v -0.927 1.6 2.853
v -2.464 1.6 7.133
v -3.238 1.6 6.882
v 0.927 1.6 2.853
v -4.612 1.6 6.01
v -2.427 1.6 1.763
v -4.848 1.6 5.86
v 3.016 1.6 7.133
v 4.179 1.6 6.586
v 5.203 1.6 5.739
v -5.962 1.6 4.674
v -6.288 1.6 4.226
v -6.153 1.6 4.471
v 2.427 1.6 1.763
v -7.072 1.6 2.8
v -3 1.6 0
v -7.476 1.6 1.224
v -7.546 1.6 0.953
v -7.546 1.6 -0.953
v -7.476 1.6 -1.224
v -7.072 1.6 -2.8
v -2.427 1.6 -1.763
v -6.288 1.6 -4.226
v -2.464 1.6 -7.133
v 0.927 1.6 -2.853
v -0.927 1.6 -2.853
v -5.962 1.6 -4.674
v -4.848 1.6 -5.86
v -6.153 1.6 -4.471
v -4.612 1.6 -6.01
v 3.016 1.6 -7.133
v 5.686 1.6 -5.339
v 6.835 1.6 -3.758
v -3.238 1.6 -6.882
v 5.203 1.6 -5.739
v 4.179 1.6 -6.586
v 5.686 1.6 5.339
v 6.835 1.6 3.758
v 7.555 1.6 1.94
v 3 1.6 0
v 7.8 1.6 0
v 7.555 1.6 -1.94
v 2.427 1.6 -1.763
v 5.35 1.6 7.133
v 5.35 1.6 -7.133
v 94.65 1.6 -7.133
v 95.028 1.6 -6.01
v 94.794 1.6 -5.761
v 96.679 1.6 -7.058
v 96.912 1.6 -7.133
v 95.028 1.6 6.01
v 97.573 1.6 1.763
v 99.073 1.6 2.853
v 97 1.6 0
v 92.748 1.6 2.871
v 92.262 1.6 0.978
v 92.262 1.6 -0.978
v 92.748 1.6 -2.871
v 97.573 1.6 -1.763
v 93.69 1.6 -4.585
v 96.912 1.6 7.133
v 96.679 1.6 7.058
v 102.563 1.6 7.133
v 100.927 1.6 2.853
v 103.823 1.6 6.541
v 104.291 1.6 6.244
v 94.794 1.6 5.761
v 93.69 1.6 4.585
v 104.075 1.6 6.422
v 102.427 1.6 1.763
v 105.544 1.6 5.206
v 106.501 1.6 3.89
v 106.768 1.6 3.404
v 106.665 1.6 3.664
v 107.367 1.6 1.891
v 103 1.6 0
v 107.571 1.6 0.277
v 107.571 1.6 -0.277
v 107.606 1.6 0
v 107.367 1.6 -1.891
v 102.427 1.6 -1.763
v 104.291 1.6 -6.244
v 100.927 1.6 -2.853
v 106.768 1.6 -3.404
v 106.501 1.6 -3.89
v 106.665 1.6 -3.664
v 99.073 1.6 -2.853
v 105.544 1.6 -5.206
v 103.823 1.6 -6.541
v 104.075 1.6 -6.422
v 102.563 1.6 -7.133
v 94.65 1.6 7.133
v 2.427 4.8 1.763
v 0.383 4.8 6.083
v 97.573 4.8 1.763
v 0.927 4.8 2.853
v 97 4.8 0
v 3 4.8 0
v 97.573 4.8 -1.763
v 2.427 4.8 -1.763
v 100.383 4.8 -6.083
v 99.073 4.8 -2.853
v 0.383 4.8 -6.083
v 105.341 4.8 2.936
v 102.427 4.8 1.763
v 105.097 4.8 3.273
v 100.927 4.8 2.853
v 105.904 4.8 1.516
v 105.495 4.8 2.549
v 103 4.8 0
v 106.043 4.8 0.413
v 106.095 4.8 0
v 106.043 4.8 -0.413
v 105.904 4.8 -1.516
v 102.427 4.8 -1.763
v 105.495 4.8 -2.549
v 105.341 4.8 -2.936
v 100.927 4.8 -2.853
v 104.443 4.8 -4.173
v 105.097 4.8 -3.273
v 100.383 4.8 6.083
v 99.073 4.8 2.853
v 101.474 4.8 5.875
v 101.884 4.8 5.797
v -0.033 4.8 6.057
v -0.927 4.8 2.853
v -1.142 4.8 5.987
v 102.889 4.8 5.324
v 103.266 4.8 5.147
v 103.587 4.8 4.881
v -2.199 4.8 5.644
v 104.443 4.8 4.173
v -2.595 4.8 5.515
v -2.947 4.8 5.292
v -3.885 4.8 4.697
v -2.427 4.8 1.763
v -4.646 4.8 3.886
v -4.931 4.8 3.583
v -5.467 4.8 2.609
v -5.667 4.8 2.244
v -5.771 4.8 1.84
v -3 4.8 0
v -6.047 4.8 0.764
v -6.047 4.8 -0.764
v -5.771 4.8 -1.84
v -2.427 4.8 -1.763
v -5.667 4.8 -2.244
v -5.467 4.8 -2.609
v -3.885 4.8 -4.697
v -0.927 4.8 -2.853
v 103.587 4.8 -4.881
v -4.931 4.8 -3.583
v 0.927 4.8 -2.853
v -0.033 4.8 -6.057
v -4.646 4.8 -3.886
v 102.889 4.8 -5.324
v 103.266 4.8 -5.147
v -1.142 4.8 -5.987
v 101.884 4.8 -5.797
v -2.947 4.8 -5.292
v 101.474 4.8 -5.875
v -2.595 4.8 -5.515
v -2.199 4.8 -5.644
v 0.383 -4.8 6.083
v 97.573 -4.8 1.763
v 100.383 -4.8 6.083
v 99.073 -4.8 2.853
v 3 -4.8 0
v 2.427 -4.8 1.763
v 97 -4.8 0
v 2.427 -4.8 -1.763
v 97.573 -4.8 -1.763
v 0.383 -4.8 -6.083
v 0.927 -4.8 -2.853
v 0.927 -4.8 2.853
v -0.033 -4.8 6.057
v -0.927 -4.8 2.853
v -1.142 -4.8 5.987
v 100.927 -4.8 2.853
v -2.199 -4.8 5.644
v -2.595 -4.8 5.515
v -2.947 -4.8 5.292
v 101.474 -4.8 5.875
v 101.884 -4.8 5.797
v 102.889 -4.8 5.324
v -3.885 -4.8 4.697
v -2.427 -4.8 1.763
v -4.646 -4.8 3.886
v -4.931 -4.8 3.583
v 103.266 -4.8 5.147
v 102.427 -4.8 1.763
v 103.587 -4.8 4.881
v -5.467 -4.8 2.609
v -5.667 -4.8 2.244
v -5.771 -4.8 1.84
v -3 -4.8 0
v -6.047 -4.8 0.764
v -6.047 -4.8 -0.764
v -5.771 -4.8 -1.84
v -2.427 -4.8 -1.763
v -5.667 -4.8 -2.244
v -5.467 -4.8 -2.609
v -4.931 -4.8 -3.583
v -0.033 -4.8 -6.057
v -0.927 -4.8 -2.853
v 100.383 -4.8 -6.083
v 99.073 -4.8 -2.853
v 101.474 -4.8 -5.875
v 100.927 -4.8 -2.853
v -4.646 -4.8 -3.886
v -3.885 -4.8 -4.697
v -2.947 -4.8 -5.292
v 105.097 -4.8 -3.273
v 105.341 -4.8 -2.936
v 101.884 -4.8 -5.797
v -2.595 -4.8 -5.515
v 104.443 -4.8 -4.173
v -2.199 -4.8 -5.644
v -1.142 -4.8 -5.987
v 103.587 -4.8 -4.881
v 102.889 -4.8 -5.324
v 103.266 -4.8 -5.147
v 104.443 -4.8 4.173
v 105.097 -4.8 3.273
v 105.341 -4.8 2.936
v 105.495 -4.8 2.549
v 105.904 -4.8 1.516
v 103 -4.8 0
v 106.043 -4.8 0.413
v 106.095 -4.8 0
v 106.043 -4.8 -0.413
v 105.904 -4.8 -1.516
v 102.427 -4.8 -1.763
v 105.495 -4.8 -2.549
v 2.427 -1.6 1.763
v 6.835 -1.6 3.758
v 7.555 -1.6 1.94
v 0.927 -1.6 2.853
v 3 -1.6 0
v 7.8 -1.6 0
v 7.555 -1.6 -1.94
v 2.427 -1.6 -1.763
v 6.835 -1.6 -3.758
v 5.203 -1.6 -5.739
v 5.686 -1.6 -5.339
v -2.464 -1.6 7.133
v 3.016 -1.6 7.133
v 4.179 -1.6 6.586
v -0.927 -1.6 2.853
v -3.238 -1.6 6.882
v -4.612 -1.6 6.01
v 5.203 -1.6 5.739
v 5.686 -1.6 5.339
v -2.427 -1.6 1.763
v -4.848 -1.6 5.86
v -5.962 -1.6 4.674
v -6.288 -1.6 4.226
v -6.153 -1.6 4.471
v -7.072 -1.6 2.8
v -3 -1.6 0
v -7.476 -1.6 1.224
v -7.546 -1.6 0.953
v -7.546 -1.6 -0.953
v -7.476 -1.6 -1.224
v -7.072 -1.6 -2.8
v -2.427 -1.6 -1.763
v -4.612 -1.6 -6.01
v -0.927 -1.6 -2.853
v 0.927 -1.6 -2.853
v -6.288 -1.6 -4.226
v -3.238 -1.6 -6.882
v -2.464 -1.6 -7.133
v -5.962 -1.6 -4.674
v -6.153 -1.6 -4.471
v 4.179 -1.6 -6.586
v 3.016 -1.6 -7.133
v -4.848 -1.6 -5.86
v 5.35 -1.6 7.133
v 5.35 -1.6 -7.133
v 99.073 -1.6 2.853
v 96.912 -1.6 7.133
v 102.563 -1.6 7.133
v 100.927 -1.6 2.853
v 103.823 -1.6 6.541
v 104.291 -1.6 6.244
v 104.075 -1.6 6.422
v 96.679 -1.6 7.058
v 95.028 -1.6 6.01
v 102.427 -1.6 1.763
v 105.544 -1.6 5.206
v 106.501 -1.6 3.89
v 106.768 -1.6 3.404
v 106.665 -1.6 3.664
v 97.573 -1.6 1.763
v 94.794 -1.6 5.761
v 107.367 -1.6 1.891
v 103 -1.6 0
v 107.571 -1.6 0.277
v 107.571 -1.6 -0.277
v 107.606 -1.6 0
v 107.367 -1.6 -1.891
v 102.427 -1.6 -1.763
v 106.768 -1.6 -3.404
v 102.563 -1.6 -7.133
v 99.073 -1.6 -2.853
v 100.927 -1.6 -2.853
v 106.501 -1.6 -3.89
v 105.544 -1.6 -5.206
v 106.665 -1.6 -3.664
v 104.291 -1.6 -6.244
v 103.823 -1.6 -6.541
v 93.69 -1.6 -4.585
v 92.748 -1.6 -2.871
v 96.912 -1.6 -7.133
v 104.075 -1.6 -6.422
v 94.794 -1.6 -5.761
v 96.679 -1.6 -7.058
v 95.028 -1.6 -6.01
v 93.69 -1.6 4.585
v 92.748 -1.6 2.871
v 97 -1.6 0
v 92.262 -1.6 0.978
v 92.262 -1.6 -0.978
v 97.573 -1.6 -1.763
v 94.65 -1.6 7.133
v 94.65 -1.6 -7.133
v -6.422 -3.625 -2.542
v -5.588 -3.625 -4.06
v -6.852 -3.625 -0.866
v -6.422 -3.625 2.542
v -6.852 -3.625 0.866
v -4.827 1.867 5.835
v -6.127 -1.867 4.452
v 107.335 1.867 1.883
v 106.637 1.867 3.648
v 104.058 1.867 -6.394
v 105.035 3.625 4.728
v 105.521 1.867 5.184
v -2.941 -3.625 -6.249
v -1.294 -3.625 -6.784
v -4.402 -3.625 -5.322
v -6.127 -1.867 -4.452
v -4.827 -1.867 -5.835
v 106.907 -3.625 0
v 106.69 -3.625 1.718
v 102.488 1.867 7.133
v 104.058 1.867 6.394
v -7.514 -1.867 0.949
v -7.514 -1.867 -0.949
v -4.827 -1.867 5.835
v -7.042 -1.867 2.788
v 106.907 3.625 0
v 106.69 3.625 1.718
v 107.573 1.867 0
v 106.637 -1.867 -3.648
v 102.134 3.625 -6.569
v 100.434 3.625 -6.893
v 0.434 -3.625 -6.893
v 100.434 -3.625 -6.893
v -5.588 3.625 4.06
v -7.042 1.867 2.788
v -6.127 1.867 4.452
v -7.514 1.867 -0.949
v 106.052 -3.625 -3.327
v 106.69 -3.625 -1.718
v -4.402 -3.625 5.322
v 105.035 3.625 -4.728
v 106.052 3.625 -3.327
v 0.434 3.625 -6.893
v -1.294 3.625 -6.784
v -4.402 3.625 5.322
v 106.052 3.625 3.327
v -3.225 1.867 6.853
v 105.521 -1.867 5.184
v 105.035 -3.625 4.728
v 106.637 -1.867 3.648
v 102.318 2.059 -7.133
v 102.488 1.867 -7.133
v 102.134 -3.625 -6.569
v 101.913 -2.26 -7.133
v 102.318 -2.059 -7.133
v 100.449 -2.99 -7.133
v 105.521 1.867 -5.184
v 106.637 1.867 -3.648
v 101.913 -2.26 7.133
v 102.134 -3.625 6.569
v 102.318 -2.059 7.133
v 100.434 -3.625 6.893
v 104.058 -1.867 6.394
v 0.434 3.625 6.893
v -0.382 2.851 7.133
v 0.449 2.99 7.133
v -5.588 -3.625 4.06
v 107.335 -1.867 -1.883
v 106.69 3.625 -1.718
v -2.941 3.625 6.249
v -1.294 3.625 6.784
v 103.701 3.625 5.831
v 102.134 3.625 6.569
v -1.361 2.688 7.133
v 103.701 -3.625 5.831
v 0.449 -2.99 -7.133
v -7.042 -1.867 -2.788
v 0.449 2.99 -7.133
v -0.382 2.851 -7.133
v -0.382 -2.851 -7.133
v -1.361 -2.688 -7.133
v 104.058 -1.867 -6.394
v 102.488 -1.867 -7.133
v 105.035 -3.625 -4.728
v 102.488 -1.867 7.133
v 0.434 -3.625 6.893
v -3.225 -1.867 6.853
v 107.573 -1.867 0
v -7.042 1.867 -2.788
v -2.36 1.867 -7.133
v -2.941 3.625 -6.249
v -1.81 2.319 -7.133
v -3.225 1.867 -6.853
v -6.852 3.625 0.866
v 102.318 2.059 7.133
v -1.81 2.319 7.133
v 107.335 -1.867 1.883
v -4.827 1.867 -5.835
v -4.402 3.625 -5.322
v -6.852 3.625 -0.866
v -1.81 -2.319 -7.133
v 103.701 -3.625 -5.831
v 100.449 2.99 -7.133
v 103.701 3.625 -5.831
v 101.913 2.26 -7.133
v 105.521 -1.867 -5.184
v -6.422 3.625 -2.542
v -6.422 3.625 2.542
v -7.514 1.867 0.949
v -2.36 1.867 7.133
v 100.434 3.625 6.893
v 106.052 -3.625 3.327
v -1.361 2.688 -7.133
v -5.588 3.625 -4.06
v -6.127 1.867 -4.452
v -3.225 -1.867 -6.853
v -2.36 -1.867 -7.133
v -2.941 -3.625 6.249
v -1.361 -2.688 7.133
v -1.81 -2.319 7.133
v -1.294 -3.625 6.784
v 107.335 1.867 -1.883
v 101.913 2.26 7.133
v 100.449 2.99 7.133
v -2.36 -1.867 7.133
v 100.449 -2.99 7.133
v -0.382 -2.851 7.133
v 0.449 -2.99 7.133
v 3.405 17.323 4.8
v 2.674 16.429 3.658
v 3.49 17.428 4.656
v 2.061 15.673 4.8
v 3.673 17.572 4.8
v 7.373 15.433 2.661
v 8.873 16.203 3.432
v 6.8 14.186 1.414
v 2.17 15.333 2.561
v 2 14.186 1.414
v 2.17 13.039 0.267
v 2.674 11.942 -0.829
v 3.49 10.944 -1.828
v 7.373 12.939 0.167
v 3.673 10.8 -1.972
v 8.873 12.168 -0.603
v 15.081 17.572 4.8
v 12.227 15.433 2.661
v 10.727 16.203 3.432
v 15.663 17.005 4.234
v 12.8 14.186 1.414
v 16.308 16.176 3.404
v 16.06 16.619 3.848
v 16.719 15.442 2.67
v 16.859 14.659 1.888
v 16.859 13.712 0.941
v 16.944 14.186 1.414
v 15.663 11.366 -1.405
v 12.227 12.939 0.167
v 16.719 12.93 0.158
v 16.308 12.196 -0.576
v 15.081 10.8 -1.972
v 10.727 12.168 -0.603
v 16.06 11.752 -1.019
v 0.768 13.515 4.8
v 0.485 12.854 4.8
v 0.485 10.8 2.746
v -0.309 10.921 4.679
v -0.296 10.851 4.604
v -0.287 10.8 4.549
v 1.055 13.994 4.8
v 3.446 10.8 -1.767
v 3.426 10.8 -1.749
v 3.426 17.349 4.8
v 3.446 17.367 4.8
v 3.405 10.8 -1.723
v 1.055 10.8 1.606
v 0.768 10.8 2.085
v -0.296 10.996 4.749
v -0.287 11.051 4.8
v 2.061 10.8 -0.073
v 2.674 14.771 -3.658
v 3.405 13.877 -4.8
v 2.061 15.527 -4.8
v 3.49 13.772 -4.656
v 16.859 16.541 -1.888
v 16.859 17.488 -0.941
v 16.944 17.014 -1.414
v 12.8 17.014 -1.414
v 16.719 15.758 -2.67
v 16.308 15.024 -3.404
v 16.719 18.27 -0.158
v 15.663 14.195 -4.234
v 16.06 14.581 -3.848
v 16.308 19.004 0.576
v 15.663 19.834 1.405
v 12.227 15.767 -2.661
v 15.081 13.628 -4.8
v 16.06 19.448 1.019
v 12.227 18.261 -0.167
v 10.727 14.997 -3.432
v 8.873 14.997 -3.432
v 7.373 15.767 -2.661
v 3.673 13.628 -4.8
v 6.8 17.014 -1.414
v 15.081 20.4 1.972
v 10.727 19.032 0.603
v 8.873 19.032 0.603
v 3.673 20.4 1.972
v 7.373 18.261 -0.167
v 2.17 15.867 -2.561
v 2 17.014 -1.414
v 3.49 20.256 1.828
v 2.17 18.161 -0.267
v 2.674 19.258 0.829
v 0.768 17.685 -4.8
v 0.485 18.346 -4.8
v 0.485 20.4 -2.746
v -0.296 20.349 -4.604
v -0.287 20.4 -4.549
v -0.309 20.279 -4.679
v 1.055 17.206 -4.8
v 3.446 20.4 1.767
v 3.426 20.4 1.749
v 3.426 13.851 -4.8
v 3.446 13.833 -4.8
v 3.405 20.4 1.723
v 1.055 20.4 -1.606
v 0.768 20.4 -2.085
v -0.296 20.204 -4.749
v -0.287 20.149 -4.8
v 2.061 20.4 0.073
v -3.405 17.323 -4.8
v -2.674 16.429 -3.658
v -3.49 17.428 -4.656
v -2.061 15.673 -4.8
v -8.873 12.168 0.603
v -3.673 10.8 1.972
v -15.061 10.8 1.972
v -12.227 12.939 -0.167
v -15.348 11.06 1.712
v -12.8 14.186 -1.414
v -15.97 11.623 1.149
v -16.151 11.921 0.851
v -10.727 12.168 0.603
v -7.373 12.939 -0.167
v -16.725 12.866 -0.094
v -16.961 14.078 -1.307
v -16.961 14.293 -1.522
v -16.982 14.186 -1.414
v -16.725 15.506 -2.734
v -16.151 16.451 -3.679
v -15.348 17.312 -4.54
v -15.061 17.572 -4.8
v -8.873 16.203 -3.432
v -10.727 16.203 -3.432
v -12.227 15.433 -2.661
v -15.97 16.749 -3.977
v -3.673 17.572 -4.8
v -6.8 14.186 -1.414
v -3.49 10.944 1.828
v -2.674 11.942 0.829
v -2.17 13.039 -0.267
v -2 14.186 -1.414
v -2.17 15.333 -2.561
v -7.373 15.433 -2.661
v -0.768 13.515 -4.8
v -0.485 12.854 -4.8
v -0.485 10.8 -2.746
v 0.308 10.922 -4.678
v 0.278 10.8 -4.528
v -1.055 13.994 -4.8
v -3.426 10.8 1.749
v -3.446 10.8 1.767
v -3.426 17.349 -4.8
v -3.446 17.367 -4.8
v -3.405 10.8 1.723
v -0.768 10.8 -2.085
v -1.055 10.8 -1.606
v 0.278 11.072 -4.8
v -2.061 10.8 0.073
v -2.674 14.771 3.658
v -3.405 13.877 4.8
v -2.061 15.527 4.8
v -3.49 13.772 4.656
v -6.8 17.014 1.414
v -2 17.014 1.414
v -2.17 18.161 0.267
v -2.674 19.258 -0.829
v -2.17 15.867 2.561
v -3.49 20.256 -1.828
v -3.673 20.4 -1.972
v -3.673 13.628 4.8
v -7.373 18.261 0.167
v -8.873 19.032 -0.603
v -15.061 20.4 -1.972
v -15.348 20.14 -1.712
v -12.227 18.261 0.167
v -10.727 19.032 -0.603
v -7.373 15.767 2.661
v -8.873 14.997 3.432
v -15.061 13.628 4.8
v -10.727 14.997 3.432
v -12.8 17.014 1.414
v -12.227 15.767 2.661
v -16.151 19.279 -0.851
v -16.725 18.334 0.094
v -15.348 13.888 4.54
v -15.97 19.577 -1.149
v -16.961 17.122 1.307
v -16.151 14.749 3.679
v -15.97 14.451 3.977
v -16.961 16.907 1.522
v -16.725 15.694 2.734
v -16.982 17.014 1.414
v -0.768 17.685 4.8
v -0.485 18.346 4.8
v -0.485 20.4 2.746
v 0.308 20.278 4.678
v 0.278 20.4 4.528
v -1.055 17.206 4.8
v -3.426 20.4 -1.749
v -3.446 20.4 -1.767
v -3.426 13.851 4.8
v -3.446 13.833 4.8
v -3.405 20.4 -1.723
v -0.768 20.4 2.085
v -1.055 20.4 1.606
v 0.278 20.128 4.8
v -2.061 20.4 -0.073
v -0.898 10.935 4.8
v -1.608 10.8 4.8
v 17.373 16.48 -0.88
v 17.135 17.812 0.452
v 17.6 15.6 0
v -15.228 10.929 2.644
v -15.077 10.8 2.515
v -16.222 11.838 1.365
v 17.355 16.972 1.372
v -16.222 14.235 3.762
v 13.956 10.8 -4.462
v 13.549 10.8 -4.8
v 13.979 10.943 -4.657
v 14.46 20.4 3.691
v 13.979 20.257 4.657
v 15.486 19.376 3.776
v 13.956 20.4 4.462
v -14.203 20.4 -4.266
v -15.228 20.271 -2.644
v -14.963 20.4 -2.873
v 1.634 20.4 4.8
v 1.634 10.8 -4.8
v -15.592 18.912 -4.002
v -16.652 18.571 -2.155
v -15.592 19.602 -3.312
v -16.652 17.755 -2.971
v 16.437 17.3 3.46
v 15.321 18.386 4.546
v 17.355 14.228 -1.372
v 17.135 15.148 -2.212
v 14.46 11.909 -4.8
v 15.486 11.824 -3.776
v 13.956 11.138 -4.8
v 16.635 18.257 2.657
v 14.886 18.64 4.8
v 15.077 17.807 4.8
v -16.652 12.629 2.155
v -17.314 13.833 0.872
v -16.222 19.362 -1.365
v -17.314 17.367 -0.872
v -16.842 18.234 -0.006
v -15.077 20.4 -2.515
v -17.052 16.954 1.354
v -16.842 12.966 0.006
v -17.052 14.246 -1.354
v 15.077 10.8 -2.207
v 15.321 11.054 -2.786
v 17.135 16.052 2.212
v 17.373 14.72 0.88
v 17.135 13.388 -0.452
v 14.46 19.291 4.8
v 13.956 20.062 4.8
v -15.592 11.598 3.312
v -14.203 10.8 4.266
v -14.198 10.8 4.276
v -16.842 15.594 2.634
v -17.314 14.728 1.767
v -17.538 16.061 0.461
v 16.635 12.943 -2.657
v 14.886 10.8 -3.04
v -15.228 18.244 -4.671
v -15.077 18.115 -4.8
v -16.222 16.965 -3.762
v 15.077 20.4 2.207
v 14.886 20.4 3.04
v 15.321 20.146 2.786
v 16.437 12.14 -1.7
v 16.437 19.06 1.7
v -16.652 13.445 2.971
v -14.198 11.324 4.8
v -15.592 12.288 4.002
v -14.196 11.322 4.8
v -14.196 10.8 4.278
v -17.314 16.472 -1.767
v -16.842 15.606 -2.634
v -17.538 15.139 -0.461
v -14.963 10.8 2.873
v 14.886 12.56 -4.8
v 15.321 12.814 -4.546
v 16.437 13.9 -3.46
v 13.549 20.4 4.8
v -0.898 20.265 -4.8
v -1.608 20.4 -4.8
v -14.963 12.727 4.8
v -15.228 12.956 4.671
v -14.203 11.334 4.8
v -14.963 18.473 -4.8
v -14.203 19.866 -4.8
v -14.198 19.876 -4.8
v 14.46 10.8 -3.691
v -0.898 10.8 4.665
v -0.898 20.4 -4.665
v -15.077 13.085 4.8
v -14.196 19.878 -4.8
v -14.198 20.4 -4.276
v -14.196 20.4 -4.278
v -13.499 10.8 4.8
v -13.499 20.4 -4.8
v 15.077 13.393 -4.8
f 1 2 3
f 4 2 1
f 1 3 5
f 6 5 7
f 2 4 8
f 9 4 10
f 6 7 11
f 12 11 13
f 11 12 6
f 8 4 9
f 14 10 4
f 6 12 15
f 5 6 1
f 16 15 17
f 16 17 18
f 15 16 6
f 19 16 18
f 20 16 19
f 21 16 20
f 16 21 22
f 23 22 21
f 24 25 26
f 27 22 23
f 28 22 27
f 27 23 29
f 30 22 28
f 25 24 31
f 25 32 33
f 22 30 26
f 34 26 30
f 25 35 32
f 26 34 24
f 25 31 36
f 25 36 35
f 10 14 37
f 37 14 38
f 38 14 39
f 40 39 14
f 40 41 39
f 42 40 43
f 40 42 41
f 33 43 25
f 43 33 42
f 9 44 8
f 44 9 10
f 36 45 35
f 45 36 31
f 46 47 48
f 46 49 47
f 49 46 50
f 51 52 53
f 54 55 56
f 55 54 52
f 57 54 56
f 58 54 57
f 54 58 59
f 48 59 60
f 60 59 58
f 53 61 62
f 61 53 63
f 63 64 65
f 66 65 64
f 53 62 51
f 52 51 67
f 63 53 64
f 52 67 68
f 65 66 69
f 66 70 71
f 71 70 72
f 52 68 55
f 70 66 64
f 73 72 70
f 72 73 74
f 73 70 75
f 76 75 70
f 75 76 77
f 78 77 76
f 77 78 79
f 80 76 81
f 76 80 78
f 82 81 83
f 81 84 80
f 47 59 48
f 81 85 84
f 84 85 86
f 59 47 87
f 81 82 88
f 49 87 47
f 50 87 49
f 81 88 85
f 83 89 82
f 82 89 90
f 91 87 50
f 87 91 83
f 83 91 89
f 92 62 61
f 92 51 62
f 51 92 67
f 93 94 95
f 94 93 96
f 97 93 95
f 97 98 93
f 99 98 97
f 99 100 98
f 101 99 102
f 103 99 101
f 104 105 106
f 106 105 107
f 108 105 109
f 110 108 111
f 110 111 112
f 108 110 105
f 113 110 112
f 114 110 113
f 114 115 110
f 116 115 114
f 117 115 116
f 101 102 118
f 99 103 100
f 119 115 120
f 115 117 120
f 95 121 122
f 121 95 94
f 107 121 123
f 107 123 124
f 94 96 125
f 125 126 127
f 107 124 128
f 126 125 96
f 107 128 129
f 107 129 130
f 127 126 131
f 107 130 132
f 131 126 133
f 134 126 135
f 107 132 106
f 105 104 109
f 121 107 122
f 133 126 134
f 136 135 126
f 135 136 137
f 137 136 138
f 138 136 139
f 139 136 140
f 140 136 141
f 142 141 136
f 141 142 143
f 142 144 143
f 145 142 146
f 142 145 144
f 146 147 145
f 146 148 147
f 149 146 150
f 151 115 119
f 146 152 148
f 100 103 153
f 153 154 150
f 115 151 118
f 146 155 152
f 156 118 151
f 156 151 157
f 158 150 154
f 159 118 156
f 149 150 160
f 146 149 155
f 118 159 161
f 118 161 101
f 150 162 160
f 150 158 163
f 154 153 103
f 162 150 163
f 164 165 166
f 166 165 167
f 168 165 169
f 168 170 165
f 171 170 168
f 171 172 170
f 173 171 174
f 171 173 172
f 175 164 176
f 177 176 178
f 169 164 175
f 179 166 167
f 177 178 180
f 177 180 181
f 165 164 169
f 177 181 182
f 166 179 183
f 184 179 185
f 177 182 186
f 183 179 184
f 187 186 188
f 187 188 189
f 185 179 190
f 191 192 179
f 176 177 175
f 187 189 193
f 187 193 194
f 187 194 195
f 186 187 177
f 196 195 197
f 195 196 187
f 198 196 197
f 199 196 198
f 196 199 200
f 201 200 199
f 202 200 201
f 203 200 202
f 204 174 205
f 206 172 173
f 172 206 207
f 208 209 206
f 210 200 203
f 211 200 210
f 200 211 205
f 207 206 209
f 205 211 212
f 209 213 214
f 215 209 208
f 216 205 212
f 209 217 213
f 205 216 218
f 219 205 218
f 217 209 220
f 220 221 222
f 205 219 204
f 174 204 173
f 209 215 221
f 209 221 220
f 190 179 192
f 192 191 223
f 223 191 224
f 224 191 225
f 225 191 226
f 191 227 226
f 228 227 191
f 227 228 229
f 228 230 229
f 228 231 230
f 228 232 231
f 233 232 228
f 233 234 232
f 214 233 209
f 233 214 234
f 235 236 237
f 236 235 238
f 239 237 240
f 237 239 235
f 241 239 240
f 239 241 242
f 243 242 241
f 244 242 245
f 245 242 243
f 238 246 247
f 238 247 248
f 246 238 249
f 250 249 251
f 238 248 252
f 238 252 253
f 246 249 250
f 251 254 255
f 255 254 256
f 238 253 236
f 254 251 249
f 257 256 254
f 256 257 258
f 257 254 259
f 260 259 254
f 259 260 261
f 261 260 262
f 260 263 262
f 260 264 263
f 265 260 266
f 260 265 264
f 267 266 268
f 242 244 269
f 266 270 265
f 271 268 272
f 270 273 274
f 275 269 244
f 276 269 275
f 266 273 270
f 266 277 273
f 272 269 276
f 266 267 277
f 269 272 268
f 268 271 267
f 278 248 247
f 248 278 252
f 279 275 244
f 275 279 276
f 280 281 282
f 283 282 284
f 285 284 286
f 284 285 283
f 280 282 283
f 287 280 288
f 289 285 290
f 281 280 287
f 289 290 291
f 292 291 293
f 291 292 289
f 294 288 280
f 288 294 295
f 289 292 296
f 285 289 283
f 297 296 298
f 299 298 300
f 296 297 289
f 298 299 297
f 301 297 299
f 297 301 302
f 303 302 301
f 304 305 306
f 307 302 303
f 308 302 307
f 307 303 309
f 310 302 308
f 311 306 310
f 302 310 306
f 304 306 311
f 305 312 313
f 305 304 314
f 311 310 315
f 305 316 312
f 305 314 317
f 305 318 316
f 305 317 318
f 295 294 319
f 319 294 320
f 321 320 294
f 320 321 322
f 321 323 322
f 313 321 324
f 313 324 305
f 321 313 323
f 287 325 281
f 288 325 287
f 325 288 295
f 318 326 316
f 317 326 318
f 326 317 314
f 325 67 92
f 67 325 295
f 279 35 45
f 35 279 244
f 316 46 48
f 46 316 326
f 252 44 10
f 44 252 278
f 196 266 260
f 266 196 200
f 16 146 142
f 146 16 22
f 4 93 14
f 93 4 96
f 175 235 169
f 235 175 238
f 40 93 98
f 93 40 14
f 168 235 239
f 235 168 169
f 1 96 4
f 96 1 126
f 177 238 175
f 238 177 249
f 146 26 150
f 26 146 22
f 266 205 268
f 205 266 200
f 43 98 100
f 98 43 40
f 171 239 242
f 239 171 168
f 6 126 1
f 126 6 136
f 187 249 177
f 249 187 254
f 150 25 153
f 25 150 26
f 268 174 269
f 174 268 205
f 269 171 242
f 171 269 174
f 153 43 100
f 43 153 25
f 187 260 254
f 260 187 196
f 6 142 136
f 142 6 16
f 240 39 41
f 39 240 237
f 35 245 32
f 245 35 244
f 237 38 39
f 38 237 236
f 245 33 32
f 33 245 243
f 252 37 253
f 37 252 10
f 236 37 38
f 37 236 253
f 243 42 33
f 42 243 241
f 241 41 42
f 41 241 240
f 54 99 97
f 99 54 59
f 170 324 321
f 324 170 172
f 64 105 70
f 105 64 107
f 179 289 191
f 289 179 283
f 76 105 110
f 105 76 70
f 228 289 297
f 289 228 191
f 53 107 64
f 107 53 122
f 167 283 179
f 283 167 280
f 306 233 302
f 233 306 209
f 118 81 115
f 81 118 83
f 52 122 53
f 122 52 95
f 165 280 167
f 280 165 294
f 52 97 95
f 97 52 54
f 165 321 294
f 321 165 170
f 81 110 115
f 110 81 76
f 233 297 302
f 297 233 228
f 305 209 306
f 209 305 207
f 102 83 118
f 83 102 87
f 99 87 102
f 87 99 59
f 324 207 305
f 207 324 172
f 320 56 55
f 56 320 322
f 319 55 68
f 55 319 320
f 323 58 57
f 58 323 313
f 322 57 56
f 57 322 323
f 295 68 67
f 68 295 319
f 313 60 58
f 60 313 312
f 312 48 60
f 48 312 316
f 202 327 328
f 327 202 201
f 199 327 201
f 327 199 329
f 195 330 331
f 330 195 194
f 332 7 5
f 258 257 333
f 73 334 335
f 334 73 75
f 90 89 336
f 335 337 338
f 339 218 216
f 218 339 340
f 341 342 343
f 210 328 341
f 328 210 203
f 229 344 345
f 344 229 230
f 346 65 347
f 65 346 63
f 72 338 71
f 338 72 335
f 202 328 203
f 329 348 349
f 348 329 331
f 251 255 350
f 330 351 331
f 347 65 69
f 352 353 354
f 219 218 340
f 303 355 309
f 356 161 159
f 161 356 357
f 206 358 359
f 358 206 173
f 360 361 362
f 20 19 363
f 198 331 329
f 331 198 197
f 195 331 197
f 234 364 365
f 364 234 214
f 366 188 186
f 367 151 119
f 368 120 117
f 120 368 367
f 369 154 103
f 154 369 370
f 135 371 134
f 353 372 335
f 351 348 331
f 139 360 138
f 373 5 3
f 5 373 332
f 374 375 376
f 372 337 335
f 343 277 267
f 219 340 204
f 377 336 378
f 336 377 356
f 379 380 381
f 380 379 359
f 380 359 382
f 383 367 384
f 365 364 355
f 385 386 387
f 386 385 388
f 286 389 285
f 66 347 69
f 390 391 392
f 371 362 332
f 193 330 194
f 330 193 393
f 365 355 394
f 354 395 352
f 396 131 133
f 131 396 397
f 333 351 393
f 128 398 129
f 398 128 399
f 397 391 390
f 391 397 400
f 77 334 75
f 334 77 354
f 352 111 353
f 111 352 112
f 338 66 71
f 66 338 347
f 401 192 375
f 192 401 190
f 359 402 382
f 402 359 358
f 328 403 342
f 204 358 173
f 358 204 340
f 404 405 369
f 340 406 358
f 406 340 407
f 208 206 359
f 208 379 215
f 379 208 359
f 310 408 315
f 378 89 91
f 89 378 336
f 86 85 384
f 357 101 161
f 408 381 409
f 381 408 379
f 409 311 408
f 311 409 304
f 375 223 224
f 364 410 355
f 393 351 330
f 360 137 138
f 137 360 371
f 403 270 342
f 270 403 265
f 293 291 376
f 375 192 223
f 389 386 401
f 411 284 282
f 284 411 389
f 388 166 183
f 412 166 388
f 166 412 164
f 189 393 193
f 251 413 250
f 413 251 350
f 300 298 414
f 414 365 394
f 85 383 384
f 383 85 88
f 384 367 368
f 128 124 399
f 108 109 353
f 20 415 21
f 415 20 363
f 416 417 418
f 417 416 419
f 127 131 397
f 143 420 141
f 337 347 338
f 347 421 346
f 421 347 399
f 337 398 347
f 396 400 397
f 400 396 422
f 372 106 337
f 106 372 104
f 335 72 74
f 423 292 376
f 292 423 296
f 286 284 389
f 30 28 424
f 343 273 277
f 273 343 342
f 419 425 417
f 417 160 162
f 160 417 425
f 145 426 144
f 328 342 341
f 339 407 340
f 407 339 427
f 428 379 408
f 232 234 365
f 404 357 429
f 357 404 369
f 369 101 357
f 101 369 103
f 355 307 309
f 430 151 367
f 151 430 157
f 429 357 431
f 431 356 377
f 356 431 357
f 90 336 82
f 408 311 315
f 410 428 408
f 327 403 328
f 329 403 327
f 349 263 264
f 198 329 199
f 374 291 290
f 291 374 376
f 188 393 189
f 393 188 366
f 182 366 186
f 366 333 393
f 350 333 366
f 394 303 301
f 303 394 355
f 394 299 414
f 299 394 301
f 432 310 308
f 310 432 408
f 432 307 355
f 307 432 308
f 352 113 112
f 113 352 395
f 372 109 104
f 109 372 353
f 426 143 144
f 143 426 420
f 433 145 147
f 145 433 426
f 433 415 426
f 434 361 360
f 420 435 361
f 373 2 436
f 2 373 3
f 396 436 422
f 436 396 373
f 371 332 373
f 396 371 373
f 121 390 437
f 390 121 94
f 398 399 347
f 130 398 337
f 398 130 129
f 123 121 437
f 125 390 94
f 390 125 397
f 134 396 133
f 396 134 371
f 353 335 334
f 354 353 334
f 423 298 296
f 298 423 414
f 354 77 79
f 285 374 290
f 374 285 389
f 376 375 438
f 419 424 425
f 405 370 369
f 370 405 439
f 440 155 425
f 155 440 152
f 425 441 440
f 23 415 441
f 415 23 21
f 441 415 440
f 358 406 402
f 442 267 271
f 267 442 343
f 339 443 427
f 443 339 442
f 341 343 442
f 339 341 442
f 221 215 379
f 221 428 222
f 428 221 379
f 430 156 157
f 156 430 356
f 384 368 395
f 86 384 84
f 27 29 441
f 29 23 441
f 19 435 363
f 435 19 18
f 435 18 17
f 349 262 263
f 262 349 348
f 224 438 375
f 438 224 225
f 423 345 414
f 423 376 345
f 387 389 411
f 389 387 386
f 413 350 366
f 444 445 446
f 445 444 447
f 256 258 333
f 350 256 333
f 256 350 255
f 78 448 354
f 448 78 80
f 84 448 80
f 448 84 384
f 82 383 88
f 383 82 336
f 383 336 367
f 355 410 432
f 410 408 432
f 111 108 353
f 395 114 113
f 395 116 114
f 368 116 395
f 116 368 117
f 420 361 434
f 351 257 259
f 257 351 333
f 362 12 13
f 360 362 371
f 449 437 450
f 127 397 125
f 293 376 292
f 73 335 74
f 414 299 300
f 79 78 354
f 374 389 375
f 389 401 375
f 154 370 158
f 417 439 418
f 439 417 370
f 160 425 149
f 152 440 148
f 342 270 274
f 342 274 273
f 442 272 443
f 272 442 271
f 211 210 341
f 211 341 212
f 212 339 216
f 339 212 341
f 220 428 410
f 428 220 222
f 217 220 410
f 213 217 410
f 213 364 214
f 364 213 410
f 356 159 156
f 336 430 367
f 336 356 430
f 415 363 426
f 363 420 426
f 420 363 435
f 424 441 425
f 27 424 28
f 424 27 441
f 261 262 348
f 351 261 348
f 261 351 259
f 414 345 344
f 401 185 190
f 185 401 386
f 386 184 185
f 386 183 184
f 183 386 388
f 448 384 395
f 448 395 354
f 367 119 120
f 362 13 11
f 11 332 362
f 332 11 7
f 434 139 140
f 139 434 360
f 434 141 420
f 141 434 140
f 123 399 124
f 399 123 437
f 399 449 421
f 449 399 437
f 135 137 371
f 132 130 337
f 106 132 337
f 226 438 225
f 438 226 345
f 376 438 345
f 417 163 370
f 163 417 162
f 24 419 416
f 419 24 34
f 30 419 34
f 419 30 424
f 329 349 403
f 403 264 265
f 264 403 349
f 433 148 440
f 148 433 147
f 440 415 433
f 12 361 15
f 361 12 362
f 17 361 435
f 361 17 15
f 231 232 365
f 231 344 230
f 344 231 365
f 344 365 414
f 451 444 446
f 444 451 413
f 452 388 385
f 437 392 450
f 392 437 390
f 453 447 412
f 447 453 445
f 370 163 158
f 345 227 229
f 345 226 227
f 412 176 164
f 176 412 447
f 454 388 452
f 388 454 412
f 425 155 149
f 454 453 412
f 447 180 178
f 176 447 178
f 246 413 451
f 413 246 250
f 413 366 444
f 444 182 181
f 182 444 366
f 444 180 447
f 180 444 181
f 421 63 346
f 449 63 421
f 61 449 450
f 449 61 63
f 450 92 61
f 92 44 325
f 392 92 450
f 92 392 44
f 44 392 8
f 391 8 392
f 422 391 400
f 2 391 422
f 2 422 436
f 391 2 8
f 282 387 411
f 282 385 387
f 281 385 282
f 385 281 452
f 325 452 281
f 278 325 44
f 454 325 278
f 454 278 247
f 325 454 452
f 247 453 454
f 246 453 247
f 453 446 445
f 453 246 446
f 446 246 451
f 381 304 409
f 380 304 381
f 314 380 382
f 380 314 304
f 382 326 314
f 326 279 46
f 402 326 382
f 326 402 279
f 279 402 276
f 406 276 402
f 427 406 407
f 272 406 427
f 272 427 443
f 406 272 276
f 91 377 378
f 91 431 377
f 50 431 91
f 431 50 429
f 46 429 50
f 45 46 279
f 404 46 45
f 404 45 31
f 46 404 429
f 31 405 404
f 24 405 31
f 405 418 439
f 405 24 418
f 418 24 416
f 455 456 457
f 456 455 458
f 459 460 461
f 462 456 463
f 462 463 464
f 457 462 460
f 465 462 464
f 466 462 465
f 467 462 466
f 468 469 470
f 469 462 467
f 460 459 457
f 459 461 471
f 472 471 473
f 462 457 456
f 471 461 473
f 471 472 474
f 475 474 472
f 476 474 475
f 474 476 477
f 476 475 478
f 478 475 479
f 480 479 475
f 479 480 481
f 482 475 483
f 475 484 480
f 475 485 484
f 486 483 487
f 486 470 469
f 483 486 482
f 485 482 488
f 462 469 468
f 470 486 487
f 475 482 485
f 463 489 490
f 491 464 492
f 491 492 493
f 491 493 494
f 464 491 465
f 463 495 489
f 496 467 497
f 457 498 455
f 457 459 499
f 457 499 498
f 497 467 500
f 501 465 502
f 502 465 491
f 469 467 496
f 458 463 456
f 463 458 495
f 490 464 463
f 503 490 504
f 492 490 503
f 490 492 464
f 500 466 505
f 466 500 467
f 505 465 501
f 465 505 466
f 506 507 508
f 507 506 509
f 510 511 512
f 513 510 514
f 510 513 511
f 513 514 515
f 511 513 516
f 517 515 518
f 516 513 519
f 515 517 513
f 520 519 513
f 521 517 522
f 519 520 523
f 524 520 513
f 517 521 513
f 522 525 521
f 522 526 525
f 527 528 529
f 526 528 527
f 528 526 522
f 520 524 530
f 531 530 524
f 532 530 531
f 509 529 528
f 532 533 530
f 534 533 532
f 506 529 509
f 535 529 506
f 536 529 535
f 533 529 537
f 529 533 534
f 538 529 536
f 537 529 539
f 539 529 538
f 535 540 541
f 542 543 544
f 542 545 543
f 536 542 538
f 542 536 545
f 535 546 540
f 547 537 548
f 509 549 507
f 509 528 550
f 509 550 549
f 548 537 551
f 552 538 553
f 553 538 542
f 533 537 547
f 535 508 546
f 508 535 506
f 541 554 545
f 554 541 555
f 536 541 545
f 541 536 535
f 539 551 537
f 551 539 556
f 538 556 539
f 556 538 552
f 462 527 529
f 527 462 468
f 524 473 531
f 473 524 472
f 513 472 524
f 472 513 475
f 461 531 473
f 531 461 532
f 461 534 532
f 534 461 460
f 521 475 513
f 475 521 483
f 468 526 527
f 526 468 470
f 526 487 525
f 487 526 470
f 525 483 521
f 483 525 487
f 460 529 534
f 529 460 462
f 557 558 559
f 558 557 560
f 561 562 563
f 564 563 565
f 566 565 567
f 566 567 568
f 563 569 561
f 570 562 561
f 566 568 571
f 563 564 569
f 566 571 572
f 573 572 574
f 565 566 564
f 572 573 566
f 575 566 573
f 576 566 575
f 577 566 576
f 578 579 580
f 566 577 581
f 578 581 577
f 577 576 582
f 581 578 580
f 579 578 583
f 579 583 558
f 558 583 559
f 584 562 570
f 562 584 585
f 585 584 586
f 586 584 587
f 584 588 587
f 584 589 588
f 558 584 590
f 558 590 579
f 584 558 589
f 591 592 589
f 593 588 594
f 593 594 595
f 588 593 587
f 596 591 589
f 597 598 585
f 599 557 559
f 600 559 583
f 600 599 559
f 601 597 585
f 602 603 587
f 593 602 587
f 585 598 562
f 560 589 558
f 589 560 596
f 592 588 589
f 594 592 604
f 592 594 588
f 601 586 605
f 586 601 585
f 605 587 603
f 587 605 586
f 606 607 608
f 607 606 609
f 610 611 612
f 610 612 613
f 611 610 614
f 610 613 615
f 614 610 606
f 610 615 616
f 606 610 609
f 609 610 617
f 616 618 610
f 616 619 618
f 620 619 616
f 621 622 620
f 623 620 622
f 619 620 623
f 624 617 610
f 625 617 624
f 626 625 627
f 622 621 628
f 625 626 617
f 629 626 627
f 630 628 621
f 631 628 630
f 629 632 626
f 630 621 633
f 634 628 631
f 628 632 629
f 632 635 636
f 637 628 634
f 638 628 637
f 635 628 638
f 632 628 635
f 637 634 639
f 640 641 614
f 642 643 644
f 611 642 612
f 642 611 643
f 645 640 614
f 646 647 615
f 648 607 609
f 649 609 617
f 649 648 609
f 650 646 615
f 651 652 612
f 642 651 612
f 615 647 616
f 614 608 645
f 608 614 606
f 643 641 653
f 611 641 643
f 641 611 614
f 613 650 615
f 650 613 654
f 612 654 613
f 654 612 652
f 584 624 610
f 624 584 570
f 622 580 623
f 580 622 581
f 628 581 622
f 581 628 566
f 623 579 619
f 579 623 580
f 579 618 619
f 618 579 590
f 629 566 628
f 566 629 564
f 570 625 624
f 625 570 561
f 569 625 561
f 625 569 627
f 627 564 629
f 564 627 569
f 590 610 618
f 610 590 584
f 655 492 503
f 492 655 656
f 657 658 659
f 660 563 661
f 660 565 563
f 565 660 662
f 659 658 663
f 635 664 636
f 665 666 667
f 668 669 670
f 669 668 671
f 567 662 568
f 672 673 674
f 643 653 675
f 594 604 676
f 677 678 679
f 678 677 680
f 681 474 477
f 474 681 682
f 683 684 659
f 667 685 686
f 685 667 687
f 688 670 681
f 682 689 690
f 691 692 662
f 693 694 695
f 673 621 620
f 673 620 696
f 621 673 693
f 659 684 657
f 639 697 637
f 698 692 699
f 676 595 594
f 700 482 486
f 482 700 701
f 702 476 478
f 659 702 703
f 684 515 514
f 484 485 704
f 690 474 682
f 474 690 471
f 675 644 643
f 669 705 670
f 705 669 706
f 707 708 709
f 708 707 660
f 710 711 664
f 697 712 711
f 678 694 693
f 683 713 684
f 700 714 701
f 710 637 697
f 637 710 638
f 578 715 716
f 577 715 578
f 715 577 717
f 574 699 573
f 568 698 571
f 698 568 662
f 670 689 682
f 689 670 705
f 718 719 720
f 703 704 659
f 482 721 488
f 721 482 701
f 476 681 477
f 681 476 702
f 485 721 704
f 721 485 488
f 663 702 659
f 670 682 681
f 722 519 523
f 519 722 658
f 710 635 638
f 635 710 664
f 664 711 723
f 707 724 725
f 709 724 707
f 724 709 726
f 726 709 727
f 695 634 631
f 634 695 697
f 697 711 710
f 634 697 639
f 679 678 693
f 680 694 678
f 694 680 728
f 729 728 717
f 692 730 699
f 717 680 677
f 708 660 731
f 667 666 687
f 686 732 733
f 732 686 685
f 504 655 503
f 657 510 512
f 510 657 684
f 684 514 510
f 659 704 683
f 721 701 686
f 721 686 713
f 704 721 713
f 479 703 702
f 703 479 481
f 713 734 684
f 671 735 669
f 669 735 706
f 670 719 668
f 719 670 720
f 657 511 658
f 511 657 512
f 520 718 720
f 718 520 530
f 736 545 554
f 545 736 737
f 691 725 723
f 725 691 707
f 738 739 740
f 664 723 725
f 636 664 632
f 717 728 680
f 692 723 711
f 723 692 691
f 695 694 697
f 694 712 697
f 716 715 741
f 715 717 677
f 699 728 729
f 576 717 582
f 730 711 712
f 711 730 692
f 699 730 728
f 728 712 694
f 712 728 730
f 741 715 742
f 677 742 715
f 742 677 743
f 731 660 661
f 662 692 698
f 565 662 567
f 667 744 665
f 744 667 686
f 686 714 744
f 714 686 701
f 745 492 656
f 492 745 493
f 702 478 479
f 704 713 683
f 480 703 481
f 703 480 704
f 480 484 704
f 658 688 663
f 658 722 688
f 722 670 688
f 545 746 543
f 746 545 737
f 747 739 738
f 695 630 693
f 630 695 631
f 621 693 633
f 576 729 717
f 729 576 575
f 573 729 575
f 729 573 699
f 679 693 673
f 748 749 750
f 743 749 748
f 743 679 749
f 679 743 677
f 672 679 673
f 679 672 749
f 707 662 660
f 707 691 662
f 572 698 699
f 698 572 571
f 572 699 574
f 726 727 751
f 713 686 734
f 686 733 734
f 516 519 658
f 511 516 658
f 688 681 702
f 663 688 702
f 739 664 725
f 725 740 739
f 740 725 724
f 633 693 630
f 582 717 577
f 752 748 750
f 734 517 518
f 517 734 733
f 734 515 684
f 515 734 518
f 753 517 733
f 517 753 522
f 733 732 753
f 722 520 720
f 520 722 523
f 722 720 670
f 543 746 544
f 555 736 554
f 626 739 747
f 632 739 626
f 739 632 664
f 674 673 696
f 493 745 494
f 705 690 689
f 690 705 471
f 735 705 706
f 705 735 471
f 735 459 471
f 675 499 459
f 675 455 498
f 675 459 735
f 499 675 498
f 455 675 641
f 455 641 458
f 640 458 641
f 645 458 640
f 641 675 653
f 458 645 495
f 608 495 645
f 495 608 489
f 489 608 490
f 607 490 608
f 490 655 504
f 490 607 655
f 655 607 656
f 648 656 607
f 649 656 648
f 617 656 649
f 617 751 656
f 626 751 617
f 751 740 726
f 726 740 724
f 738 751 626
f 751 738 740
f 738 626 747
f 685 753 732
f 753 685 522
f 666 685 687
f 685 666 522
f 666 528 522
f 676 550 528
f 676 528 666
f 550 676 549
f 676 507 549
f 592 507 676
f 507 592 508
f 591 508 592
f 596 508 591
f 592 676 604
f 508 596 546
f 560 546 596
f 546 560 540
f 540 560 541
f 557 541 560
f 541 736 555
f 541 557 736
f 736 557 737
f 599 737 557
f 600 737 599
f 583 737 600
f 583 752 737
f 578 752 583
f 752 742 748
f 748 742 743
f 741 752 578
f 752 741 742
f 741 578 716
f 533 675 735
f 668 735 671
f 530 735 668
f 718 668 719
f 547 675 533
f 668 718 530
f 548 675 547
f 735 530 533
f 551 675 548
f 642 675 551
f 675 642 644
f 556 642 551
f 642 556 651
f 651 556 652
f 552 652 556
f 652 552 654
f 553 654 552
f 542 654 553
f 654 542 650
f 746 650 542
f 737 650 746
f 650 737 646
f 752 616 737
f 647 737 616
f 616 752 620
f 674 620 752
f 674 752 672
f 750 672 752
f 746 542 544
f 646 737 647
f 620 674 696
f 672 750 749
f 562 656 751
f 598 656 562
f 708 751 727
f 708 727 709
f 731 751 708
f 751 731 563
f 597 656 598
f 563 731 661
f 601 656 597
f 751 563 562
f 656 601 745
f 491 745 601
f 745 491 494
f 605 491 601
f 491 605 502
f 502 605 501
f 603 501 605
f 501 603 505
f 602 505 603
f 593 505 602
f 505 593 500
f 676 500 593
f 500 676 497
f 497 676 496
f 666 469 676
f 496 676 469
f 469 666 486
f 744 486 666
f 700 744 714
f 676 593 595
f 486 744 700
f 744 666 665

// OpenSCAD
// Low-spec flexible driveshaft
// (hopefully! not sure how it will work out..)

ra = 3;
t = 4;
r = ra + 1.2*t;
d = r + t/2;

t_rod = 0.8*t;
f=1.3;

module link_hole() {
    translate([d,0,-4*t]) cylinder(r=ra, h=8*t);
    for(a=[0,180]) rotate([a,0]) translate([d,0, t/2]) cylinder(r1=r,r2=r+4*t, h=8*t);
}

// A link in the chain, connecting two directions so it can keep its angle.
// (hopefully)
module link_whole() {
    difference() { hull() {
            translate([d, 0]) scale([r, r, f*t]/r) sphere(r);
            translate([-d, 0]) scale([r, f*t, r]/r) sphere(r);
        }
        link_hole();
        rotate([90,0]) rotate(180) link_hole();
    }
}

module link_whole_printable() {
    intersection() {
        rotate([45,0]) link_whole();
        //Flatten bottom(and rest, for symmetry)
        cube([8*r, 2*r-1.5*t, 2*r-1.5*t], center=true);
    }
}

module rod(l) {
    t = t_rod;
    pos = [0, l];
    intersection() {
        hull() for(x = pos) translate([x,0]) sphere(r);
        difference() {
            union() {
                for(z=[-t, t]) translate([0,0,z]) cube([8*l, 2*r, t], center=true);
                translate([l/2,0,-1.5*t]) cylinder(r=l/2-r+t, h=3*t);
            }
            for(x = pos) translate([x,0]) {
                translate([0,0,-4*t]) cylinder(r=ra, h=8*t);
                translate([0,0,-t/2]) cylinder(r=r, h=t);
            }
        }
    }
}

module rod_printable(l) {
    intersection() {
        rotate([90,0]) rod(l);
        cube([8*l,2*r, 2*r-t/3], center=true);
    }
}

rod_printable(100);
translate([0,2*r]) link_whole_printable();

// TODO animate it.
